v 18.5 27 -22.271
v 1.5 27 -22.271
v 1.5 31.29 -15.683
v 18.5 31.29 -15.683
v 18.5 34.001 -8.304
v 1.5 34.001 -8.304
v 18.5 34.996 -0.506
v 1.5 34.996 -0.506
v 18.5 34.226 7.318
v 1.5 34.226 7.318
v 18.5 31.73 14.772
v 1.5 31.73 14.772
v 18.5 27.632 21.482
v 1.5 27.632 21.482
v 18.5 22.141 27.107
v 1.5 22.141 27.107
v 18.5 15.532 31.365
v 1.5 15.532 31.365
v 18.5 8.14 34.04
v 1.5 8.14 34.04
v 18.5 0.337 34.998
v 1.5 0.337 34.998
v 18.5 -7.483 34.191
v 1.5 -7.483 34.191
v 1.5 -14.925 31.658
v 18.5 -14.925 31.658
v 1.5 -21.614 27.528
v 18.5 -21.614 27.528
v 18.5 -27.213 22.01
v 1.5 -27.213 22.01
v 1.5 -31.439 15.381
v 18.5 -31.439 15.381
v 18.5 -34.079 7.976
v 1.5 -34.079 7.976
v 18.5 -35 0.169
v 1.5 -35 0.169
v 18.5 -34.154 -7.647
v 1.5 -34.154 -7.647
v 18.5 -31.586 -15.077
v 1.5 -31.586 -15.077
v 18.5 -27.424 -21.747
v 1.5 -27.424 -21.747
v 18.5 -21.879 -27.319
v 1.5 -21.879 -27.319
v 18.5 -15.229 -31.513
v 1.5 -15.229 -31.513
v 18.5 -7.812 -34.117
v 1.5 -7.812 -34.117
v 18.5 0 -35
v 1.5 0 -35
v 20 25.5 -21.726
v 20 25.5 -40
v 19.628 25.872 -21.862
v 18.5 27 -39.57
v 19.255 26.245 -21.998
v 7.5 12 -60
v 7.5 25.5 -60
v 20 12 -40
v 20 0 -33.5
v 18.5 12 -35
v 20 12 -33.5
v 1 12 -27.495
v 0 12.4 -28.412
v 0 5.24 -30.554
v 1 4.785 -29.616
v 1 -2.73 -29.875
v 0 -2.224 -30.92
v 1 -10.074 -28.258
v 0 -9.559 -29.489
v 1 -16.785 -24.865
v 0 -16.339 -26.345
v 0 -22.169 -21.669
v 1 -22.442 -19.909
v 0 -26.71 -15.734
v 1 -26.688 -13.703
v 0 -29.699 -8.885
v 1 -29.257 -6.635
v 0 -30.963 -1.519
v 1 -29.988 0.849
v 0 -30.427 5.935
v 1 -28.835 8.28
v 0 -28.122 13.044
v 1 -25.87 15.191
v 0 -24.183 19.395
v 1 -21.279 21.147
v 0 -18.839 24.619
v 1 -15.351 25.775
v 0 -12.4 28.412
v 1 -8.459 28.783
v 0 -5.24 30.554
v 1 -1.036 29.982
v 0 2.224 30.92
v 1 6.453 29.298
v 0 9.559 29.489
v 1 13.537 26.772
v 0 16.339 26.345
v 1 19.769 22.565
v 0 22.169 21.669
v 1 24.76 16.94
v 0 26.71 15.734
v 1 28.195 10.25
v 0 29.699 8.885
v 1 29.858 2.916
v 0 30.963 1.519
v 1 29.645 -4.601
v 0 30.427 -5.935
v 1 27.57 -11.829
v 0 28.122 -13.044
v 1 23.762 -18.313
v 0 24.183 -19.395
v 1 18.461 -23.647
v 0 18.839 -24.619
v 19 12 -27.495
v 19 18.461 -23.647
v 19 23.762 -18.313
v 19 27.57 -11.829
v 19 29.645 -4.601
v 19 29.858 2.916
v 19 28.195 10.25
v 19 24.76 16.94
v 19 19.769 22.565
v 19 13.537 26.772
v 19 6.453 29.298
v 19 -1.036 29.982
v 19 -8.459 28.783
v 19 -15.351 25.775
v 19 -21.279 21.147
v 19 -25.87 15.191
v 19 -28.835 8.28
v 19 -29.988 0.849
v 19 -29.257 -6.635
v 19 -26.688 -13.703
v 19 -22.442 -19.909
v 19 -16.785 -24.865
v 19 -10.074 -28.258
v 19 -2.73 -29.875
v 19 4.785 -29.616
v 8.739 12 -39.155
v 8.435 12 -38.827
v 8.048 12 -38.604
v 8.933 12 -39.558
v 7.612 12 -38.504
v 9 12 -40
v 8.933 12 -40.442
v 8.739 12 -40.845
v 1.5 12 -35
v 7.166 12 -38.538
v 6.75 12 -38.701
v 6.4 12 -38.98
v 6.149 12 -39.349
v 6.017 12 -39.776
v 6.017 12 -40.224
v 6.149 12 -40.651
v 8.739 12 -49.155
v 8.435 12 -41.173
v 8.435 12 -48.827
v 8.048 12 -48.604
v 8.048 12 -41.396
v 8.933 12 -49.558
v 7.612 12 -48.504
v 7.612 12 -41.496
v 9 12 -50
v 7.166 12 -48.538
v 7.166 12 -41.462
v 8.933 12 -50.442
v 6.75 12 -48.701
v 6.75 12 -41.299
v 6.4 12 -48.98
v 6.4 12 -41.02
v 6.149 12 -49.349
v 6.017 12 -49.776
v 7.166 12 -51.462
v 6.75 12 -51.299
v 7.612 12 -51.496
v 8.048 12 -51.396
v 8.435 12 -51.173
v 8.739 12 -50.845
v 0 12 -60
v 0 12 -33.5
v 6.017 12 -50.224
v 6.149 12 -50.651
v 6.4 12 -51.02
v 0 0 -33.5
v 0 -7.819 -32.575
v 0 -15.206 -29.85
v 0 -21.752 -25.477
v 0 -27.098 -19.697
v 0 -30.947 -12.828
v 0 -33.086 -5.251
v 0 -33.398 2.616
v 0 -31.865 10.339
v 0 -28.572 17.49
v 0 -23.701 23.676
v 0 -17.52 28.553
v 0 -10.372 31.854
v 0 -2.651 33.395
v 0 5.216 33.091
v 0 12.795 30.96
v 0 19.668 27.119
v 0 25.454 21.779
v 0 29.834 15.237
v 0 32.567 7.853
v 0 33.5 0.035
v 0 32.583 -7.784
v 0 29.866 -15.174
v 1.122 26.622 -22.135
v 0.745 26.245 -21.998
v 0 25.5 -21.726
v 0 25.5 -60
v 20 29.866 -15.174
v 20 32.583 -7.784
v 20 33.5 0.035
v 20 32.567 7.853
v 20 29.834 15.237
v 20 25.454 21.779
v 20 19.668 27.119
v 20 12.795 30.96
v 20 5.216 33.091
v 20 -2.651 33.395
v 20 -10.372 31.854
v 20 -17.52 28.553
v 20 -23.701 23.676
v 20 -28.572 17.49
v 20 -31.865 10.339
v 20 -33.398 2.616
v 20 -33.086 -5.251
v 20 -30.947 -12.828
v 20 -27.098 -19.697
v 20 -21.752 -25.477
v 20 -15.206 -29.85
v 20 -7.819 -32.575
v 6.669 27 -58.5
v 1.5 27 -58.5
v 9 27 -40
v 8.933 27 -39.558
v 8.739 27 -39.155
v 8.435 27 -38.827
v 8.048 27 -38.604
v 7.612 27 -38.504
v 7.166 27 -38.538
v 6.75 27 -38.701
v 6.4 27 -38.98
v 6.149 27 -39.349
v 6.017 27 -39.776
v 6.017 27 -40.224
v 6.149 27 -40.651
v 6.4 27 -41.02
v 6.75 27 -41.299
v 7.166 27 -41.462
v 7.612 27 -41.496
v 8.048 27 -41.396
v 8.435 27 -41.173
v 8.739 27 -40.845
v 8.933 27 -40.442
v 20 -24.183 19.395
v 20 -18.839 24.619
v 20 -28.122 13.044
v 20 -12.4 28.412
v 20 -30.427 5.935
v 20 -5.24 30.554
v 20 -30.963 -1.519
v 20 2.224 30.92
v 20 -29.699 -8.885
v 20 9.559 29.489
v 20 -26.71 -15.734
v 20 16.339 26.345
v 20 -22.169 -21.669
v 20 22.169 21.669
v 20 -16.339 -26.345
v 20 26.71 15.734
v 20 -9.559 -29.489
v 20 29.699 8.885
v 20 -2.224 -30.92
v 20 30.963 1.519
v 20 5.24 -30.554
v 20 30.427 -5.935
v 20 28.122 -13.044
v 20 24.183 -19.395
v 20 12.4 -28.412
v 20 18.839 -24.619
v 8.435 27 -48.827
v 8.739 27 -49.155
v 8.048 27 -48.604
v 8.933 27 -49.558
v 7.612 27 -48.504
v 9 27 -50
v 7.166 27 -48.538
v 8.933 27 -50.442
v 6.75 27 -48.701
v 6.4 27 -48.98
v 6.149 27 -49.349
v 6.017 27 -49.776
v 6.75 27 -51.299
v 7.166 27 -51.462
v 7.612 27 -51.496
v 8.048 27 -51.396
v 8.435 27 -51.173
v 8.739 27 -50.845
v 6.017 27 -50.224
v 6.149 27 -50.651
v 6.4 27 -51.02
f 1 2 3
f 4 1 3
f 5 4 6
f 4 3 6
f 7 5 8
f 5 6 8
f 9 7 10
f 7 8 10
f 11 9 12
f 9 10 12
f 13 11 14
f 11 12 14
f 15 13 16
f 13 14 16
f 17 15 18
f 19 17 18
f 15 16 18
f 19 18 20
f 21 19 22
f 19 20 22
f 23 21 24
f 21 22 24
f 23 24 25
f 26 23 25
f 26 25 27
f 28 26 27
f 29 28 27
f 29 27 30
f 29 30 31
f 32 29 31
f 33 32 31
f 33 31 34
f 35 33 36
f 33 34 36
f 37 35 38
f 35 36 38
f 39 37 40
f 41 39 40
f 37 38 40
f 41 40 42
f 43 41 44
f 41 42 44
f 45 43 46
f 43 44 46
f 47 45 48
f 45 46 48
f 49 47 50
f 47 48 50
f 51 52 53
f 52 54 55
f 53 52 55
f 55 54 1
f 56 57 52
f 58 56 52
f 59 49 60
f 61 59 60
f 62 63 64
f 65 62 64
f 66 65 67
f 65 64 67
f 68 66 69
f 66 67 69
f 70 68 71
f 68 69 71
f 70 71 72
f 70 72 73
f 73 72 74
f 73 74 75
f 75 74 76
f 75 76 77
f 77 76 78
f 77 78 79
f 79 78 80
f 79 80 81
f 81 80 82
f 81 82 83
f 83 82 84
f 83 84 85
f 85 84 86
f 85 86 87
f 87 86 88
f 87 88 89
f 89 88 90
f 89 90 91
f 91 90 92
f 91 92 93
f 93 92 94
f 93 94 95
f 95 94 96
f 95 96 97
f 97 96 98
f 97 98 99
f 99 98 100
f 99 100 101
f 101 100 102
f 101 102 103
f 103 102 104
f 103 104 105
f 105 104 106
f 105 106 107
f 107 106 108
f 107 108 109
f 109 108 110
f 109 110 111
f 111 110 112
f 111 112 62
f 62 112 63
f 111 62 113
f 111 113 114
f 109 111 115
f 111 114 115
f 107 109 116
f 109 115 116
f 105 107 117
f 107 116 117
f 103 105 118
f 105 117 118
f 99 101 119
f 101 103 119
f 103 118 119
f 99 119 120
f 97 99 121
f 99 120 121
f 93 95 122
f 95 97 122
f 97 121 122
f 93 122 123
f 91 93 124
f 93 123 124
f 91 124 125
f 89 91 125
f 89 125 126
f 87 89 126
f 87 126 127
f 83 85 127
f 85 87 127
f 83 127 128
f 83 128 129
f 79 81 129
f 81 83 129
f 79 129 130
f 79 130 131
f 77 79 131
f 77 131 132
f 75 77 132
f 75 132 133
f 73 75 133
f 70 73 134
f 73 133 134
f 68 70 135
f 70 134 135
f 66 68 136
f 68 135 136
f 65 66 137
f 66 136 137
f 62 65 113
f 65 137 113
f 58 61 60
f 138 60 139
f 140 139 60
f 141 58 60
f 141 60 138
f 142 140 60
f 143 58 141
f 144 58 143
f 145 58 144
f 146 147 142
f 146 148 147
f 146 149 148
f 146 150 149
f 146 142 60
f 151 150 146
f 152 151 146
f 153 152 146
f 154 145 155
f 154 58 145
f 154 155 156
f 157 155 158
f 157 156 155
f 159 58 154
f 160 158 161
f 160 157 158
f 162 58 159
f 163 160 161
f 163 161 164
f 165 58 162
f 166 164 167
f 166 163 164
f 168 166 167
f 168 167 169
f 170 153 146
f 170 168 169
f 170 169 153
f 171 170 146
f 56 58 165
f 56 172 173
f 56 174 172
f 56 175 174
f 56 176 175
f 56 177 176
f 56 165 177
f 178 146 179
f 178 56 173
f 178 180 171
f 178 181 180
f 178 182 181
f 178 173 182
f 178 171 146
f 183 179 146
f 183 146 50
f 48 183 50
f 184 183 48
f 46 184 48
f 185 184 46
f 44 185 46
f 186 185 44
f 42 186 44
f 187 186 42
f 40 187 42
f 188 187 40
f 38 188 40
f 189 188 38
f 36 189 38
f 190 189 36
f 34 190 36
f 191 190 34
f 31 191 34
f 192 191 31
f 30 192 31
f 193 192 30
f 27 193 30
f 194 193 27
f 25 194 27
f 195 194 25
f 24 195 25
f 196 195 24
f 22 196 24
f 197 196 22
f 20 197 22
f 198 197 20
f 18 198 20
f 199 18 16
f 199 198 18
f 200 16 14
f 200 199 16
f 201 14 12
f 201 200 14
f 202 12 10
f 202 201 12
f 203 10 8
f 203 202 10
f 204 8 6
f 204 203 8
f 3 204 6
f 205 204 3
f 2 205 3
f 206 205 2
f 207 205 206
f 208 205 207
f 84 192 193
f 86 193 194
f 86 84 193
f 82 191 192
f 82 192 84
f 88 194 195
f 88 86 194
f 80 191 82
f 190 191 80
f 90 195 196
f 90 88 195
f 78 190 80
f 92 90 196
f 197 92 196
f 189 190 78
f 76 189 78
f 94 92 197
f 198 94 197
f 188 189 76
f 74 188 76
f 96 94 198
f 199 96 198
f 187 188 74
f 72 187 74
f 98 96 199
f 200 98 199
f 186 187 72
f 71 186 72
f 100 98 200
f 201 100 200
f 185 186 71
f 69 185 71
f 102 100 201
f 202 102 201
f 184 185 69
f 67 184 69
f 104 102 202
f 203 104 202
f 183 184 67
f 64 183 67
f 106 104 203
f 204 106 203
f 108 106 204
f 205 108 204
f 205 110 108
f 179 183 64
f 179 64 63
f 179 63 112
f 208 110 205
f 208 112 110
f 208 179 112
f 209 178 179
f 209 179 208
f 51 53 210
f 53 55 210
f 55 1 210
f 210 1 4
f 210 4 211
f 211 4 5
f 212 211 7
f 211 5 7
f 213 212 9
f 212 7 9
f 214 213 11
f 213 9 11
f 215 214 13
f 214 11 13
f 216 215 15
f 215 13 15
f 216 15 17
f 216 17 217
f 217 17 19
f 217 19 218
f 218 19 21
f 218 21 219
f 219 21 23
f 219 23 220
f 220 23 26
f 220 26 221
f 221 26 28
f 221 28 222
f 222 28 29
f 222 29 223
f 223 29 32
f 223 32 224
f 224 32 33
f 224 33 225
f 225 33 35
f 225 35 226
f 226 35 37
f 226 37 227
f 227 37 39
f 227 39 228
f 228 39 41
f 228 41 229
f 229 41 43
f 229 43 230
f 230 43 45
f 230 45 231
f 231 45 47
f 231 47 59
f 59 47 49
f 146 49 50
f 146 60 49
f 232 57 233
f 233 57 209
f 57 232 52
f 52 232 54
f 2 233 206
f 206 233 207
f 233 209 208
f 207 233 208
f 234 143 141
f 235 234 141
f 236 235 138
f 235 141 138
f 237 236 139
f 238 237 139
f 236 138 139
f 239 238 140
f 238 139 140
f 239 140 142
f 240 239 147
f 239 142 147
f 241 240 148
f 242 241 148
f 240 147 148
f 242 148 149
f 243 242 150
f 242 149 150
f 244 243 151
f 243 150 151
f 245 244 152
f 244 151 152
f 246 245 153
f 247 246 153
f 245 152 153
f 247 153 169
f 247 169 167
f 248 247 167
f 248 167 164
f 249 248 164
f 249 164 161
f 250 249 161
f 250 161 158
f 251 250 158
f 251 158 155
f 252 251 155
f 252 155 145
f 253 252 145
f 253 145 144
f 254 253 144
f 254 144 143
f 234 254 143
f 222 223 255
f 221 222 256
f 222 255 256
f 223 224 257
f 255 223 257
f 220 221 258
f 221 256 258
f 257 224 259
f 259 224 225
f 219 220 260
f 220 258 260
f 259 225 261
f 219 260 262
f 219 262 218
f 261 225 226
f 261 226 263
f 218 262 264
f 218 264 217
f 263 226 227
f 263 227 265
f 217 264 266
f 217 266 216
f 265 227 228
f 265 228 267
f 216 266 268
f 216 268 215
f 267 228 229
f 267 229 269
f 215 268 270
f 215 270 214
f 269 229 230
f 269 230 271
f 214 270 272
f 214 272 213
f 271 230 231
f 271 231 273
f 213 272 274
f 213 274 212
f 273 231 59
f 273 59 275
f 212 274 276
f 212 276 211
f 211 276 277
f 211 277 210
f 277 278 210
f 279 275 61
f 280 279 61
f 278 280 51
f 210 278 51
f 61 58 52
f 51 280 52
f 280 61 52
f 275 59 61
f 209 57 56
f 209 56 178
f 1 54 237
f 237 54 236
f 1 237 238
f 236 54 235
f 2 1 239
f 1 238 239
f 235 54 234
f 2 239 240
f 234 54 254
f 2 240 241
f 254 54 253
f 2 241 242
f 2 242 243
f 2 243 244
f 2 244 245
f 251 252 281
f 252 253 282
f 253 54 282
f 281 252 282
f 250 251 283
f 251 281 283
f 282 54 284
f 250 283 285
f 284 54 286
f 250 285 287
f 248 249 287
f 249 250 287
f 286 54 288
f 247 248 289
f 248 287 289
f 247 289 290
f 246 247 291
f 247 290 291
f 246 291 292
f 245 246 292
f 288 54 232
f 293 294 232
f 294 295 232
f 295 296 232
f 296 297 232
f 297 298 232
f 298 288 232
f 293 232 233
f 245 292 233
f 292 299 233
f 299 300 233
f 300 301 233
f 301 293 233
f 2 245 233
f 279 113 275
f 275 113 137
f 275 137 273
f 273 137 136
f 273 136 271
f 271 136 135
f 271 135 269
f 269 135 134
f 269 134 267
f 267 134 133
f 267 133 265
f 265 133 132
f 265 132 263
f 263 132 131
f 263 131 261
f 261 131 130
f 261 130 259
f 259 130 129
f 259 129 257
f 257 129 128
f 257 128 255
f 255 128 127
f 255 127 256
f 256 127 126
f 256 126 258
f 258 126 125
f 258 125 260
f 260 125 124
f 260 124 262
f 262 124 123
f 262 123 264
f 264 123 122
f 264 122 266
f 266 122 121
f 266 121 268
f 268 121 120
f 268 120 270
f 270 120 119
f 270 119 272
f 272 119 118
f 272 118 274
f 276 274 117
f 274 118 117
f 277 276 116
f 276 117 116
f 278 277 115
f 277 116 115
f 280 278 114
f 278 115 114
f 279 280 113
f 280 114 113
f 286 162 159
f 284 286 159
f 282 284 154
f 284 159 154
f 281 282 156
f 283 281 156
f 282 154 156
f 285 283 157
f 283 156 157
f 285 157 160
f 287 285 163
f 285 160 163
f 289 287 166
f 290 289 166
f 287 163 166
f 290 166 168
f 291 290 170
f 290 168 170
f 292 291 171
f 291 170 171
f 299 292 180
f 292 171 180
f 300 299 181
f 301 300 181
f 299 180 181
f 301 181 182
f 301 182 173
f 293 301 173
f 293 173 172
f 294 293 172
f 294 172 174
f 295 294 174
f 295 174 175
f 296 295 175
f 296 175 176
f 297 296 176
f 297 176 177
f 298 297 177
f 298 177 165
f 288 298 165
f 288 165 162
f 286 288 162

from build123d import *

# Parameters (mm, degrees)
SKETCH_1_R          = 35
EXTRUDE_1_DEPTH     = 20
SKETCH_2_R          = 30
CUT_EXTRUDE_1_DEPTH = 54.38539126
SKETCH_3_W          = 20
SKETCH_3_H          = 15
EXTRUDE_2_DEPTH     = 25
EXTRUDE_3_REACH     = 82.777
SKETCH_4_W          = 20
SKETCH_4_H          = 12
SKETCH_5_R          = 30
CUT_EXTRUDE_2_DEPTH = 73.284161474
CUT_EXTRUDE_3_REACH = 90.566
SKETCH_8_R          = 1.5
CUT_EXTRUDE_4_DEPTH = 79.797208072
CHAMFER_1_SIZE      = 1
CHAMFER_2_SIZE      = 1.5


with BuildPart() as part:
    # 草图1 → 凸台-拉伸1 (new body)
    with BuildSketch(Plane(origin=(0, 0, 0), x_dir=(0, 0, -1), z_dir=(1, 0, 0))):
        Circle(SKETCH_1_R)
    extrude(amount=EXTRUDE_1_DEPTH)

    # 草图2 → 切除-拉伸1 (cut, through all)
    with BuildSketch(Plane(origin=(20, 0, 0), x_dir=(0, 0, -1), z_dir=(1, 0, 0))):
        Circle(SKETCH_2_R)
    extrude(amount=-CUT_EXTRUDE_1_DEPTH, mode=Mode.SUBTRACT)

    # 草图3 → 凸台-拉伸2 (add, symmetric)
    with BuildSketch(Plane(origin=(0, 0, -35), x_dir=(-1, 0, 0), z_dir=(0, 0, -1))):
        with Locations((-10, 19.5)):
            Rectangle(SKETCH_3_W, SKETCH_3_H)
    extrude(amount=EXTRUDE_2_DEPTH, both=True)

    # 草图4 → 凸台-拉伸3 (add, up to next)
    with BuildSketch(Plane(origin=(0, 0, -35), x_dir=(-1, 0, 0), z_dir=(0, 0, -1)), mode=Mode.PRIVATE) as extrude_3_sk1:
        with Locations((-10, 6)):
            Rectangle(SKETCH_4_W, SKETCH_4_H)
    extrude_3_tool1 = extrude(extrude_3_sk1.sketch, amount=-EXTRUDE_3_REACH, mode=Mode.PRIVATE) - part.part
    add(extrude_3_tool1.solids().sort_by_distance((10, 6, -35))[0])

    # 草图5 → 切除-拉伸2 (cut, through all)
    with BuildSketch(Plane(origin=(20, 0, 0), x_dir=(0, 0, -1), z_dir=(1, 0, 0))):
        Circle(SKETCH_5_R)
    extrude(amount=-CUT_EXTRUDE_2_DEPTH, mode=Mode.SUBTRACT)

    # 草图6 → 切除-拉伸3 (cut, up to next)
    with BuildSketch(Plane(origin=(0, 27, 0), x_dir=(1, 0, 0), z_dir=(0, 1, 0)), mode=Mode.PRIVATE) as cut_extrude_3_sk1:
        Polygon((7.5, 60), (20, 40), (20, 60), align=None)
    cut_extrude_3_tool1 = extrude(cut_extrude_3_sk1.sketch, amount=-CUT_EXTRUDE_3_REACH, mode=Mode.PRIVATE) & part.part
    add(cut_extrude_3_tool1.solids().sort_by_distance((15.833333, 27, -53.333333))[0], mode=Mode.SUBTRACT)

    # 草图8 → 切除-拉伸4 (cut, through all)
    with BuildSketch(Plane(origin=(0, 12, 0), x_dir=(-1, 0, 0), z_dir=(0, -1, 0))):
        with Locations(Location((-7.5, 40, 0), (0, 0, 180))):
            Circle(SKETCH_8_R)
        with Locations(Location((-7.5, 50, 0), (0, 0, 180))):
            Circle(SKETCH_8_R)
    extrude(amount=-CUT_EXTRUDE_4_DEPTH, mode=Mode.SUBTRACT)

    # 倒角1
    chamfer_1_edges = [part.edges().sort_by_distance(p)[0] for p in [
        (0, -12, 27.49545417),
        (20, -12, 27.49545417),
    ]]
    chamfer(chamfer_1_edges, length=CHAMFER_1_SIZE)

    # 倒角2
    chamfer_2_edges = [part.edges().sort_by_distance(p)[0] for p in [
        (0, -14.925029132, 31.658229663),
        (20, -14.925029132, 31.658229663),
        (0, 27, -41.135528726),
        (3.75, 27, -60),
        (20, 6, -35),
        (0, 6, -35),
        (20, 27, -31.135528726),
        (13.75, 27, -50),
    ]]
    chamfer(chamfer_2_edges, length=CHAMFER_2_SIZE)


solid = part.part
